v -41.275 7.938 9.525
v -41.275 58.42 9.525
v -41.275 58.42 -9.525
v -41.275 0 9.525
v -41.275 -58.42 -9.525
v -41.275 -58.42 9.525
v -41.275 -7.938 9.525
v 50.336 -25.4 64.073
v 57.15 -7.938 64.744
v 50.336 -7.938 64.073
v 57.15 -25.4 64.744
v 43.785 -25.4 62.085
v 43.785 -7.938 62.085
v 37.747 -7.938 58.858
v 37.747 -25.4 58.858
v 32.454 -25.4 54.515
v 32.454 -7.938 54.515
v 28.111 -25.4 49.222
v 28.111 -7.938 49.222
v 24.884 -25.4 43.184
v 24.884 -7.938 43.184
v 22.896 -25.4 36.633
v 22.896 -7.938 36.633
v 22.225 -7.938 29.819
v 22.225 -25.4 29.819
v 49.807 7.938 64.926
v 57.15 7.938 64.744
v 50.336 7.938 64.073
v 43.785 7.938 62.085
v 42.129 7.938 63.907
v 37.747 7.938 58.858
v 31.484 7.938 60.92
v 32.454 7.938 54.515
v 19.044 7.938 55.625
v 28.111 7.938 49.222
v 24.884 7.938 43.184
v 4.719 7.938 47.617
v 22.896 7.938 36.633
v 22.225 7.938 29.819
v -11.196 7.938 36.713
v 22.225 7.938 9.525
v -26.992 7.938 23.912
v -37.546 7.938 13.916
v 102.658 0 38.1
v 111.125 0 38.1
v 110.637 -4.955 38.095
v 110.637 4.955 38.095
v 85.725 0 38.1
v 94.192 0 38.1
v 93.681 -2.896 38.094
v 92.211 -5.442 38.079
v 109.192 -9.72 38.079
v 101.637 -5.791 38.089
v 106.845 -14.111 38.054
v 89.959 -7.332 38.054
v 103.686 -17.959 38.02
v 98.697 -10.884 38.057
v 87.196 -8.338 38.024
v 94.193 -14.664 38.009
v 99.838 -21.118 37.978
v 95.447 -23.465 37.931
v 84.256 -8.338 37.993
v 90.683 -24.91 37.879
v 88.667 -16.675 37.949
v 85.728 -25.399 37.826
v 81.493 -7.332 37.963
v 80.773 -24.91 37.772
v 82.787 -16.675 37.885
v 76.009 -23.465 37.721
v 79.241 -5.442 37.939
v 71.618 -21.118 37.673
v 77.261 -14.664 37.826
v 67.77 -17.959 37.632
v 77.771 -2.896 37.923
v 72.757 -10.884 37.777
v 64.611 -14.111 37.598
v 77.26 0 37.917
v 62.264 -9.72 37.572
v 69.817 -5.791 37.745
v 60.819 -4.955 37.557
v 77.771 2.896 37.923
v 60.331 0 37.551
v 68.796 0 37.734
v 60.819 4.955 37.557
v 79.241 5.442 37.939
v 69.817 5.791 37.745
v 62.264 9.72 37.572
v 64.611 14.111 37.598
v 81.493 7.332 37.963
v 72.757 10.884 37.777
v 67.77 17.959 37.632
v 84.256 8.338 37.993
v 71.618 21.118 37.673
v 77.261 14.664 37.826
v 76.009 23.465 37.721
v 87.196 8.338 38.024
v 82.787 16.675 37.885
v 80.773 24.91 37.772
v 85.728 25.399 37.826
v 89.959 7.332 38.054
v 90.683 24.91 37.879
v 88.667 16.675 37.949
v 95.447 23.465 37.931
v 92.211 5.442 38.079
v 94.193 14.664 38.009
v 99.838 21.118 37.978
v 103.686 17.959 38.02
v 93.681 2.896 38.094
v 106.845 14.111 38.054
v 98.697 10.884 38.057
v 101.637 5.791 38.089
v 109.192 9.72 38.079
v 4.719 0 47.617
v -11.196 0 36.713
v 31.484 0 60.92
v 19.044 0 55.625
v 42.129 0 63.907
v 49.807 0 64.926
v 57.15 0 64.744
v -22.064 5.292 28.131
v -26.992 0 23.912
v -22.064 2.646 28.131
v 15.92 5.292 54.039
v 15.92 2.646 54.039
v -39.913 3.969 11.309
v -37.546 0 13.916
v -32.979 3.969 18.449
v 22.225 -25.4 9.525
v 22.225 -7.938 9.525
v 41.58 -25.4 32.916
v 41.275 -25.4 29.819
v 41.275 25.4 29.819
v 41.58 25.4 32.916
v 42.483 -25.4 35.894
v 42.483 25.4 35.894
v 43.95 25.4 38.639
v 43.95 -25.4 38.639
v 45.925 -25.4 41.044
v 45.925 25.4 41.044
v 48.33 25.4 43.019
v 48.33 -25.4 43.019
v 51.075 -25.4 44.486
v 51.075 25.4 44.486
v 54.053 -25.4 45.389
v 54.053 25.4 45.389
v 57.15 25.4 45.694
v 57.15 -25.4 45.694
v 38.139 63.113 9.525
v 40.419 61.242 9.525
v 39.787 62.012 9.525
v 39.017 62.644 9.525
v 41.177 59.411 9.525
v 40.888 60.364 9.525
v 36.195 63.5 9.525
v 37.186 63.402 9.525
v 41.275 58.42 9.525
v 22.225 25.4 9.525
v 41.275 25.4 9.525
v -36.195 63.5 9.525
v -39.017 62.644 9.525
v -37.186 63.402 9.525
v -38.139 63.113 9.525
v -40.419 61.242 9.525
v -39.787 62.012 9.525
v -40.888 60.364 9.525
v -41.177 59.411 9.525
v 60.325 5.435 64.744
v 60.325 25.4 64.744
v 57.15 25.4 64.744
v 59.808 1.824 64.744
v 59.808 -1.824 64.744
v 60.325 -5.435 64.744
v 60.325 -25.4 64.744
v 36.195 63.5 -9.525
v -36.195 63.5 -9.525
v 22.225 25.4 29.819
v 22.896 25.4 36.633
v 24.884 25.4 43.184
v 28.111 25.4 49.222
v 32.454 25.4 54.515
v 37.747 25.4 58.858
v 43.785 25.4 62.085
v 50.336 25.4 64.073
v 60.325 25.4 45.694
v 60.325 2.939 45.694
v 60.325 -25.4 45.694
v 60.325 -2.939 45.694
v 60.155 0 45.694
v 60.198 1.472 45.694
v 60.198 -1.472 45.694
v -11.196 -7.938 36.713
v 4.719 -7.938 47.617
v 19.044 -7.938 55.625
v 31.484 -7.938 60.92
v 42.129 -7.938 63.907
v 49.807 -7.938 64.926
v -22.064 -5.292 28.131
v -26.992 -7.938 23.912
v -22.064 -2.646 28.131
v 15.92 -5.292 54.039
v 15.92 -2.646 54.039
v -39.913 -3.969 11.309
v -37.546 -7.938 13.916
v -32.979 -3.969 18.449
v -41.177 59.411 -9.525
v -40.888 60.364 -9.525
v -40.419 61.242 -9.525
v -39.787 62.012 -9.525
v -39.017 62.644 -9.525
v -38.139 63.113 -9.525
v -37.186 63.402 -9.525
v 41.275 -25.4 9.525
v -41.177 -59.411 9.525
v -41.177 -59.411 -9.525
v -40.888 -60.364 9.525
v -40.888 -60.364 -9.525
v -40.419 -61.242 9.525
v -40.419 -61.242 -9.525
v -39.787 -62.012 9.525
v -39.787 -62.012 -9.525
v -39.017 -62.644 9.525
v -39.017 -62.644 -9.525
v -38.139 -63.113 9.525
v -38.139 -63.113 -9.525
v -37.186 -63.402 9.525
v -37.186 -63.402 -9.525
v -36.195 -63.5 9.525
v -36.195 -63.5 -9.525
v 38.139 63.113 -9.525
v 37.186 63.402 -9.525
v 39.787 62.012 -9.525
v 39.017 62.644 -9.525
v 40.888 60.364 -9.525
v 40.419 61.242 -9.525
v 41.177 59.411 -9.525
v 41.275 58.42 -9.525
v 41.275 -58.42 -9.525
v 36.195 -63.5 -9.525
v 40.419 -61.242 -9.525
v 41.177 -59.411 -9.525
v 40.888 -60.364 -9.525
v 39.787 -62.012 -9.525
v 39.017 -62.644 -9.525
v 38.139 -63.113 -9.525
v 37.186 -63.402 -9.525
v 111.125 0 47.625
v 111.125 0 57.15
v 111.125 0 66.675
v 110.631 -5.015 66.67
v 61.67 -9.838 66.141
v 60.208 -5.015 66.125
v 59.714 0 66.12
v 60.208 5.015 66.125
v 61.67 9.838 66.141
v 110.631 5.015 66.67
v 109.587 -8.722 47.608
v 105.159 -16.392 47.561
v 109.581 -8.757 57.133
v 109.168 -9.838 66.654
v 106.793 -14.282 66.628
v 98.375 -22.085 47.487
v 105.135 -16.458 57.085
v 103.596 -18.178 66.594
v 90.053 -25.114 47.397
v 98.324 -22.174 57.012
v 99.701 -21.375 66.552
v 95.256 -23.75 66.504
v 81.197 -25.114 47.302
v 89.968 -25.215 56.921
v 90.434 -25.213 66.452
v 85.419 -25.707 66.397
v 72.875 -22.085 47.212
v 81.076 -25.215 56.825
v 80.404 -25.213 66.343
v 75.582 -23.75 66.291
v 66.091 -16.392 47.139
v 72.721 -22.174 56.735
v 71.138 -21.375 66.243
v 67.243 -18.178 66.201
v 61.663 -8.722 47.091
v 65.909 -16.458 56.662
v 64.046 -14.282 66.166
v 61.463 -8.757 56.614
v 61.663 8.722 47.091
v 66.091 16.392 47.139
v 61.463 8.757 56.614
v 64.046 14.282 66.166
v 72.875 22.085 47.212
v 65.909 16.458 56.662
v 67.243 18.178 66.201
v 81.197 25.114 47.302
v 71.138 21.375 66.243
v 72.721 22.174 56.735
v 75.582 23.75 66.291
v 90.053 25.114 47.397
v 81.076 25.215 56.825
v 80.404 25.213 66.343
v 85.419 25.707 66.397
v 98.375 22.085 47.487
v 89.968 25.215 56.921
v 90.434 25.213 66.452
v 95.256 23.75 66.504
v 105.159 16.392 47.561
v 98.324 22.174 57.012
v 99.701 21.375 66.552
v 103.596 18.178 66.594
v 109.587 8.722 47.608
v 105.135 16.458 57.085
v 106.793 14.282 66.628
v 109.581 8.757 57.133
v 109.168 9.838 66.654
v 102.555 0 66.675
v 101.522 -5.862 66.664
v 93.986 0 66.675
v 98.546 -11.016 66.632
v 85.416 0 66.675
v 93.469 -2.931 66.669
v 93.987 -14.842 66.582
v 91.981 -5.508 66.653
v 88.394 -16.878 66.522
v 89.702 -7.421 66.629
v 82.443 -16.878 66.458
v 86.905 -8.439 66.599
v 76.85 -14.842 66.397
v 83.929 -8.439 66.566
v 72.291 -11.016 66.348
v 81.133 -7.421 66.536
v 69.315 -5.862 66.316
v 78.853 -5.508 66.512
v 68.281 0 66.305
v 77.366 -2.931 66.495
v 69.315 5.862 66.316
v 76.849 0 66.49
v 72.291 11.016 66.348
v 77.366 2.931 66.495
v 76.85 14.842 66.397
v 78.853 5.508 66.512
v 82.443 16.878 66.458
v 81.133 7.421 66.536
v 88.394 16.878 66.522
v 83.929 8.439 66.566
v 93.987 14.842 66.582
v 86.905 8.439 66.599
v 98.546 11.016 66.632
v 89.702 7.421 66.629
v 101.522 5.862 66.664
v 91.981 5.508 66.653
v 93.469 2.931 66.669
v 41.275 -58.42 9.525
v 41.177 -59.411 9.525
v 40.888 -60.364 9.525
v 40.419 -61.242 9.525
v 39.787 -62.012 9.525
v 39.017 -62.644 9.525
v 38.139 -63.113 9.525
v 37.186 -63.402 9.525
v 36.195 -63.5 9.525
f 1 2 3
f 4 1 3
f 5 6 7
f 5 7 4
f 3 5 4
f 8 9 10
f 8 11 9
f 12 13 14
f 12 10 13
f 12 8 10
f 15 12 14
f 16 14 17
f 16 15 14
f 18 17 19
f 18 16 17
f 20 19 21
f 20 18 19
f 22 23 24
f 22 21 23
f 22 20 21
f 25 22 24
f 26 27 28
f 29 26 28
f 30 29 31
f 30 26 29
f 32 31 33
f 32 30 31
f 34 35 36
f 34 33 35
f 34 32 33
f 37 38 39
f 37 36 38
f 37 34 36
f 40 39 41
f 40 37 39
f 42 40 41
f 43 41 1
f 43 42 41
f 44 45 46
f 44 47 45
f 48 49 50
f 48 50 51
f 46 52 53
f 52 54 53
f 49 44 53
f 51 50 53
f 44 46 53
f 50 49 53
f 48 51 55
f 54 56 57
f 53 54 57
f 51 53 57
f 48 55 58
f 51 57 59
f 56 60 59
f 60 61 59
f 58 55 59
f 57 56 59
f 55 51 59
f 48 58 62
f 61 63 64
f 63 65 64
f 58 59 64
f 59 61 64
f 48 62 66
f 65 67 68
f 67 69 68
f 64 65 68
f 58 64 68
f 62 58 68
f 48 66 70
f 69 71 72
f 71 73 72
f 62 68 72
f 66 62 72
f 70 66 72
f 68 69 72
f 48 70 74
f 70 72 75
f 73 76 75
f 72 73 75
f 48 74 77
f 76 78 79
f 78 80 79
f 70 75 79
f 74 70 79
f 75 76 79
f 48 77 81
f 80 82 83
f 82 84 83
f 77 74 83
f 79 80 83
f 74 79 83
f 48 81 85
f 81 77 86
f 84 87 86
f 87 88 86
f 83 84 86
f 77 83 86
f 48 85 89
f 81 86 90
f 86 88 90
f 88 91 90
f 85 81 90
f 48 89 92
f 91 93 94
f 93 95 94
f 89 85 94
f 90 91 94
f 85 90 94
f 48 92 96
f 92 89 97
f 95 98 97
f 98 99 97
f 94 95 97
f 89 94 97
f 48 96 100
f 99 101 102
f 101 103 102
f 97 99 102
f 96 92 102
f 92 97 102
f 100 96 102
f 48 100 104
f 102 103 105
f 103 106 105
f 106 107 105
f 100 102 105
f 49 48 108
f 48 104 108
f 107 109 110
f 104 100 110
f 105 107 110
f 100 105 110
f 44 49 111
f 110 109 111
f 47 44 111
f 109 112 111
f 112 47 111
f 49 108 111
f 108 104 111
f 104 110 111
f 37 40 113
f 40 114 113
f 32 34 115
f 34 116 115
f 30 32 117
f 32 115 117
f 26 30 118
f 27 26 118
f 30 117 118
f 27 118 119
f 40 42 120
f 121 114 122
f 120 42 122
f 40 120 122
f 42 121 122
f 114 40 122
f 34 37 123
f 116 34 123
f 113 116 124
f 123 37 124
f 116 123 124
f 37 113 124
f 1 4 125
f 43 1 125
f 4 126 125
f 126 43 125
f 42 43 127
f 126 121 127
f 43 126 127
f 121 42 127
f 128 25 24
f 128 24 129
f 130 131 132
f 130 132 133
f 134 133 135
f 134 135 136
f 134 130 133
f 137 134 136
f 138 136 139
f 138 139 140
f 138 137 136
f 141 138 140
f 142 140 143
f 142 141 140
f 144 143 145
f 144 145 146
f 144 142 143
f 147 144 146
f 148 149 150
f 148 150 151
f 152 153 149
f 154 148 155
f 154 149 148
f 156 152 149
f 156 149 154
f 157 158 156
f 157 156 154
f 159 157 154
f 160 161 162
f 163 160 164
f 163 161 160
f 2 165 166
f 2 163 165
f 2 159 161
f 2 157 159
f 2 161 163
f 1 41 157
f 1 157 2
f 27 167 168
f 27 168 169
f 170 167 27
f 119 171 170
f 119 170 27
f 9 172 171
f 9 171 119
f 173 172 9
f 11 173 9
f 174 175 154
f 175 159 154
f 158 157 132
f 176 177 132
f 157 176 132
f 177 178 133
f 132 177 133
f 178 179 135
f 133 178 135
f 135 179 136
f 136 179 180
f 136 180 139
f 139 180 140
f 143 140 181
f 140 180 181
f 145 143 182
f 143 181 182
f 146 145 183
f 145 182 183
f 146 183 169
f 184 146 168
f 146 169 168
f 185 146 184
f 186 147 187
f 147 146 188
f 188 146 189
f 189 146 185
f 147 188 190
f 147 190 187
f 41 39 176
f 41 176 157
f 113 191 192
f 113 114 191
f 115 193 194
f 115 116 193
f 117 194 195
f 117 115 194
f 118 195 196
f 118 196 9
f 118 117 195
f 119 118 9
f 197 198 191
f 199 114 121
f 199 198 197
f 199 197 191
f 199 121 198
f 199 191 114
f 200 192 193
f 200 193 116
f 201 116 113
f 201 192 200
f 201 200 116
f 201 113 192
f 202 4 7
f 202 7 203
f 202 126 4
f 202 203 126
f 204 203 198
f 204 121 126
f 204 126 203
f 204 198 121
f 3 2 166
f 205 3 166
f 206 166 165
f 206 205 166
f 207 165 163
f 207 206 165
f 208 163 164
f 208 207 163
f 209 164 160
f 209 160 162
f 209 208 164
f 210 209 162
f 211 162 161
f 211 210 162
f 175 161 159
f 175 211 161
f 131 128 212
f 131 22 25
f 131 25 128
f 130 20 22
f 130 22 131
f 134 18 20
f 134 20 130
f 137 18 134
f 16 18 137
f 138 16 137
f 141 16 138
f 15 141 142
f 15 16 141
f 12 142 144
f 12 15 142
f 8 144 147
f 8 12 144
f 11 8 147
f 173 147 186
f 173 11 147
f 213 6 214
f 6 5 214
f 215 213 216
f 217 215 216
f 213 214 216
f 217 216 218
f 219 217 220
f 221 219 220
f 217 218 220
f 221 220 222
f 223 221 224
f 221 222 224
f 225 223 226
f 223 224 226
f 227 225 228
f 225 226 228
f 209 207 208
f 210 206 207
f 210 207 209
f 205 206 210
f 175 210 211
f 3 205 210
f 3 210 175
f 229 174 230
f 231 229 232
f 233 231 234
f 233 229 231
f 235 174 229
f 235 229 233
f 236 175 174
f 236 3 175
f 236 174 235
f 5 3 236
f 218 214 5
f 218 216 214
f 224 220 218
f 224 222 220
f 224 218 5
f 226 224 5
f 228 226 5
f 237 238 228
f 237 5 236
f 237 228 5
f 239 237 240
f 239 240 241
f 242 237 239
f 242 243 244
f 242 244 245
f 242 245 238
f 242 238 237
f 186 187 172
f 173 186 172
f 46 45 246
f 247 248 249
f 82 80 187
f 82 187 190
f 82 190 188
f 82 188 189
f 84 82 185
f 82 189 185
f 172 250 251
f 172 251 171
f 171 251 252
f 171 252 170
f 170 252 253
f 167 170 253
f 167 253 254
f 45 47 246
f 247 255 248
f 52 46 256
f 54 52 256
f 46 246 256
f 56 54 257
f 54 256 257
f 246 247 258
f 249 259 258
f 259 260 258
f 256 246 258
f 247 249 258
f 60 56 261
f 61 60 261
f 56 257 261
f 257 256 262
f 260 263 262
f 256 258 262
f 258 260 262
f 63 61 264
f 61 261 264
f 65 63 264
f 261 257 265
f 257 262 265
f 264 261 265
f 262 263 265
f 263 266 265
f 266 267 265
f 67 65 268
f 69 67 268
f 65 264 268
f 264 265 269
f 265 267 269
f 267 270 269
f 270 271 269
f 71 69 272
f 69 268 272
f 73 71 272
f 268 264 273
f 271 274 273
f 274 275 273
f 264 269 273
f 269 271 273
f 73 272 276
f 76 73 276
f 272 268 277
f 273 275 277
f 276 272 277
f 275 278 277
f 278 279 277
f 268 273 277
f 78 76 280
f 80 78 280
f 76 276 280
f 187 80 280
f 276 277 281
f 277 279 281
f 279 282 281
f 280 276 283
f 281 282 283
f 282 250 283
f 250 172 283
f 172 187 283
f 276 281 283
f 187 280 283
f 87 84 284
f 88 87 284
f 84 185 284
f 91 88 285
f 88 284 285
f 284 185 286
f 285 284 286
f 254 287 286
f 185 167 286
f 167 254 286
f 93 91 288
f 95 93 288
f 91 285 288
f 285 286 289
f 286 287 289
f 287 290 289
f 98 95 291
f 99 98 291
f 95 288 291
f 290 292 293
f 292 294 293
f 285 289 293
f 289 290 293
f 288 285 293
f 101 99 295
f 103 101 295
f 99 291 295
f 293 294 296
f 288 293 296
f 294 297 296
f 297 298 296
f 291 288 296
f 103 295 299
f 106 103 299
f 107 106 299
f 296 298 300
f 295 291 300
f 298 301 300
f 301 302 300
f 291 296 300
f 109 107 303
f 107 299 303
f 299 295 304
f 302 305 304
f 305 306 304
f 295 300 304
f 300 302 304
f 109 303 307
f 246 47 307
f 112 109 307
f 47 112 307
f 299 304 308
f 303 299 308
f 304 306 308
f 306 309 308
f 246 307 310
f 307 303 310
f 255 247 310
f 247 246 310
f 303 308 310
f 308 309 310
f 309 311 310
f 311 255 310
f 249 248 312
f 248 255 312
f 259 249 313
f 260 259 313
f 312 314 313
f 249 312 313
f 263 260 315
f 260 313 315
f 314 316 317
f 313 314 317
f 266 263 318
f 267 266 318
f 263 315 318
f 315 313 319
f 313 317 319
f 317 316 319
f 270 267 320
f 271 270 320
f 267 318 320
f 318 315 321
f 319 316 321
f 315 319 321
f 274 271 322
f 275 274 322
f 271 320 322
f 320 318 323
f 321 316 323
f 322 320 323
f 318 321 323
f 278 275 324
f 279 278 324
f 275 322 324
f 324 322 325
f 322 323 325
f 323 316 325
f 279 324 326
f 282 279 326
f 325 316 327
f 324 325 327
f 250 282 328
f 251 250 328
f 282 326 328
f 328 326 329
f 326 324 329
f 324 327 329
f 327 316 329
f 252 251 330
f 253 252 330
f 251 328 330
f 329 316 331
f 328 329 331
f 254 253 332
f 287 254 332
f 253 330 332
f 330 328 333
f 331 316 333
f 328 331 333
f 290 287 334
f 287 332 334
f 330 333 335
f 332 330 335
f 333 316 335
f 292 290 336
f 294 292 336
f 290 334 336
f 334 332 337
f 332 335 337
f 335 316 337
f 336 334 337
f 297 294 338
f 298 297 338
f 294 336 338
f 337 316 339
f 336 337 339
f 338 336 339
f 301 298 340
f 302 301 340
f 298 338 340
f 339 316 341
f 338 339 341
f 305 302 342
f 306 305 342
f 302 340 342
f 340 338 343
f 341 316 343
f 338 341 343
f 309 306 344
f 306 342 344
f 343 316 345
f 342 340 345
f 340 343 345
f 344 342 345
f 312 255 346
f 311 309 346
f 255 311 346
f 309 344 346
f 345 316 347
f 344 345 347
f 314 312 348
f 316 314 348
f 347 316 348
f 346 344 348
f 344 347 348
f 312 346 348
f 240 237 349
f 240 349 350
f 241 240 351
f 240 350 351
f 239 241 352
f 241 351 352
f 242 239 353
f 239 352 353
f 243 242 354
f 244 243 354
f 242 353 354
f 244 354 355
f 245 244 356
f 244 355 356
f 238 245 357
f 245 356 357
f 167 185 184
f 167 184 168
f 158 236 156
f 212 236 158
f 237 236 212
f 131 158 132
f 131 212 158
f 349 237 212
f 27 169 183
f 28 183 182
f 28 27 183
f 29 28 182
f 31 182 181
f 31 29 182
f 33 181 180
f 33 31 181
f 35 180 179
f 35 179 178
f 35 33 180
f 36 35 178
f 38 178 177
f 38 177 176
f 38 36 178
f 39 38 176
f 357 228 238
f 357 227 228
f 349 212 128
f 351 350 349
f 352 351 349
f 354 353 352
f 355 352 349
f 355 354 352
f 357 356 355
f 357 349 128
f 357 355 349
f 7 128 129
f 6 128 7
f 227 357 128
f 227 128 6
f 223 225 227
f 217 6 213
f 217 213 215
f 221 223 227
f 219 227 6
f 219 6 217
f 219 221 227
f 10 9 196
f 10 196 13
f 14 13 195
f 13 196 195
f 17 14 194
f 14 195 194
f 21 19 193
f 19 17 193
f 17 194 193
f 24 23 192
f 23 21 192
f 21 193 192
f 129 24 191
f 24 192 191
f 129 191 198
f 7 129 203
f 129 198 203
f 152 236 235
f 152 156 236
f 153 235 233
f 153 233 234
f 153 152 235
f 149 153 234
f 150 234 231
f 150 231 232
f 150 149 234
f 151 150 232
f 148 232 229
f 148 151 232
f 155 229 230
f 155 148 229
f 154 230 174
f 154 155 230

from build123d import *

# Parameters (mm, degrees)
F1_DEPTH = 63.5
F2_DEPTH = 25.4
F3_DEPTH = 7.9375
F5_R     = 5.08


with BuildPart() as f1:
    # F0 (on Front) → F1 (new body, symmetric)
    with BuildSketch(Plane.XZ):
        Polygon((-41.275, -9.525), (41.275, -9.525), (41.275, 9.525), (22.225, 9.525), (-41.275, 9.525), align=None)
    extrude(amount=F1_DEPTH, both=True)

    # F0 (on Front) → F2 (join, symmetric)
    with BuildSketch(Plane.XZ):
        with BuildLine():
            Line((22.225, 9.525), (41.275, 9.525))
            Line((41.275, 9.525), (41.275, 29.8189983006))
            ThreePointArc((41.275, 29.8189983006), (45.9246798487, 41.0443184519), (57.15, 45.6939983006))
            Line((57.15, 45.6939983006), (60.325, 45.6939983006))
            Line((60.325, 45.6939983006), (60.325, 64.7439983006))
            Line((60.325, 64.7439983006), (57.15, 64.7439983006))
            ThreePointArc((57.15, 64.7439983006), (32.4542956671, 54.5147026335), (22.225, 29.8189983006))
            Line((22.225, 29.8189983006), (22.225, 9.525))
        make_face()
    extrude(amount=F2_DEPTH, both=True)

    # F0 (on Front) → F3 (join, symmetric)
    with BuildSketch(Plane.XZ):
        with BuildLine():
            add(Edge.make_bspline(
                [(-41.275, 9.525), (-36.6270914674, 16.9778186828), (19.4735266268, 69.1415518522), (57.15, 64.7439983006)],
                knots=[0, 0, 0, 0, 112.8566276225, 112.8566276225, 112.8566276225, 112.8566276225], degree=3))
            Line((-41.275, 9.525), (22.225, 9.525))
            Line((22.225, 9.525), (22.225, 29.8189983006))
            ThreePointArc((22.225, 29.8189983006), (32.4542956671, 54.5147026335), (57.15, 64.7439983006))
        make_face()
    extrude(amount=F3_DEPTH, both=True)

    # F0 (on Front) → F4 (revolve)
    with BuildSketch(Plane.XZ):
        Polygon((85.416354239, 66.675), (85.6429753146, 45.6939983006), (85.725, 38.1), (111.125, 38.1), (111.125, 66.675), align=None)
    revolve(axis=Axis((85.5706771195, 0, 52.3875), (0.0108006215, 0, -0.9999416716)))

    # F5
    f5_edges = [f1.edges().sort_by_distance(p)[0] for p in [
        (41.275, -63.5, 0),
        (-41.275, -63.5, 0),
        (-41.275, 63.5, 0),
        (41.275, 63.5, 0),
    ]]
    fillet(f5_edges, radius=F5_R)


solid = f1.part
